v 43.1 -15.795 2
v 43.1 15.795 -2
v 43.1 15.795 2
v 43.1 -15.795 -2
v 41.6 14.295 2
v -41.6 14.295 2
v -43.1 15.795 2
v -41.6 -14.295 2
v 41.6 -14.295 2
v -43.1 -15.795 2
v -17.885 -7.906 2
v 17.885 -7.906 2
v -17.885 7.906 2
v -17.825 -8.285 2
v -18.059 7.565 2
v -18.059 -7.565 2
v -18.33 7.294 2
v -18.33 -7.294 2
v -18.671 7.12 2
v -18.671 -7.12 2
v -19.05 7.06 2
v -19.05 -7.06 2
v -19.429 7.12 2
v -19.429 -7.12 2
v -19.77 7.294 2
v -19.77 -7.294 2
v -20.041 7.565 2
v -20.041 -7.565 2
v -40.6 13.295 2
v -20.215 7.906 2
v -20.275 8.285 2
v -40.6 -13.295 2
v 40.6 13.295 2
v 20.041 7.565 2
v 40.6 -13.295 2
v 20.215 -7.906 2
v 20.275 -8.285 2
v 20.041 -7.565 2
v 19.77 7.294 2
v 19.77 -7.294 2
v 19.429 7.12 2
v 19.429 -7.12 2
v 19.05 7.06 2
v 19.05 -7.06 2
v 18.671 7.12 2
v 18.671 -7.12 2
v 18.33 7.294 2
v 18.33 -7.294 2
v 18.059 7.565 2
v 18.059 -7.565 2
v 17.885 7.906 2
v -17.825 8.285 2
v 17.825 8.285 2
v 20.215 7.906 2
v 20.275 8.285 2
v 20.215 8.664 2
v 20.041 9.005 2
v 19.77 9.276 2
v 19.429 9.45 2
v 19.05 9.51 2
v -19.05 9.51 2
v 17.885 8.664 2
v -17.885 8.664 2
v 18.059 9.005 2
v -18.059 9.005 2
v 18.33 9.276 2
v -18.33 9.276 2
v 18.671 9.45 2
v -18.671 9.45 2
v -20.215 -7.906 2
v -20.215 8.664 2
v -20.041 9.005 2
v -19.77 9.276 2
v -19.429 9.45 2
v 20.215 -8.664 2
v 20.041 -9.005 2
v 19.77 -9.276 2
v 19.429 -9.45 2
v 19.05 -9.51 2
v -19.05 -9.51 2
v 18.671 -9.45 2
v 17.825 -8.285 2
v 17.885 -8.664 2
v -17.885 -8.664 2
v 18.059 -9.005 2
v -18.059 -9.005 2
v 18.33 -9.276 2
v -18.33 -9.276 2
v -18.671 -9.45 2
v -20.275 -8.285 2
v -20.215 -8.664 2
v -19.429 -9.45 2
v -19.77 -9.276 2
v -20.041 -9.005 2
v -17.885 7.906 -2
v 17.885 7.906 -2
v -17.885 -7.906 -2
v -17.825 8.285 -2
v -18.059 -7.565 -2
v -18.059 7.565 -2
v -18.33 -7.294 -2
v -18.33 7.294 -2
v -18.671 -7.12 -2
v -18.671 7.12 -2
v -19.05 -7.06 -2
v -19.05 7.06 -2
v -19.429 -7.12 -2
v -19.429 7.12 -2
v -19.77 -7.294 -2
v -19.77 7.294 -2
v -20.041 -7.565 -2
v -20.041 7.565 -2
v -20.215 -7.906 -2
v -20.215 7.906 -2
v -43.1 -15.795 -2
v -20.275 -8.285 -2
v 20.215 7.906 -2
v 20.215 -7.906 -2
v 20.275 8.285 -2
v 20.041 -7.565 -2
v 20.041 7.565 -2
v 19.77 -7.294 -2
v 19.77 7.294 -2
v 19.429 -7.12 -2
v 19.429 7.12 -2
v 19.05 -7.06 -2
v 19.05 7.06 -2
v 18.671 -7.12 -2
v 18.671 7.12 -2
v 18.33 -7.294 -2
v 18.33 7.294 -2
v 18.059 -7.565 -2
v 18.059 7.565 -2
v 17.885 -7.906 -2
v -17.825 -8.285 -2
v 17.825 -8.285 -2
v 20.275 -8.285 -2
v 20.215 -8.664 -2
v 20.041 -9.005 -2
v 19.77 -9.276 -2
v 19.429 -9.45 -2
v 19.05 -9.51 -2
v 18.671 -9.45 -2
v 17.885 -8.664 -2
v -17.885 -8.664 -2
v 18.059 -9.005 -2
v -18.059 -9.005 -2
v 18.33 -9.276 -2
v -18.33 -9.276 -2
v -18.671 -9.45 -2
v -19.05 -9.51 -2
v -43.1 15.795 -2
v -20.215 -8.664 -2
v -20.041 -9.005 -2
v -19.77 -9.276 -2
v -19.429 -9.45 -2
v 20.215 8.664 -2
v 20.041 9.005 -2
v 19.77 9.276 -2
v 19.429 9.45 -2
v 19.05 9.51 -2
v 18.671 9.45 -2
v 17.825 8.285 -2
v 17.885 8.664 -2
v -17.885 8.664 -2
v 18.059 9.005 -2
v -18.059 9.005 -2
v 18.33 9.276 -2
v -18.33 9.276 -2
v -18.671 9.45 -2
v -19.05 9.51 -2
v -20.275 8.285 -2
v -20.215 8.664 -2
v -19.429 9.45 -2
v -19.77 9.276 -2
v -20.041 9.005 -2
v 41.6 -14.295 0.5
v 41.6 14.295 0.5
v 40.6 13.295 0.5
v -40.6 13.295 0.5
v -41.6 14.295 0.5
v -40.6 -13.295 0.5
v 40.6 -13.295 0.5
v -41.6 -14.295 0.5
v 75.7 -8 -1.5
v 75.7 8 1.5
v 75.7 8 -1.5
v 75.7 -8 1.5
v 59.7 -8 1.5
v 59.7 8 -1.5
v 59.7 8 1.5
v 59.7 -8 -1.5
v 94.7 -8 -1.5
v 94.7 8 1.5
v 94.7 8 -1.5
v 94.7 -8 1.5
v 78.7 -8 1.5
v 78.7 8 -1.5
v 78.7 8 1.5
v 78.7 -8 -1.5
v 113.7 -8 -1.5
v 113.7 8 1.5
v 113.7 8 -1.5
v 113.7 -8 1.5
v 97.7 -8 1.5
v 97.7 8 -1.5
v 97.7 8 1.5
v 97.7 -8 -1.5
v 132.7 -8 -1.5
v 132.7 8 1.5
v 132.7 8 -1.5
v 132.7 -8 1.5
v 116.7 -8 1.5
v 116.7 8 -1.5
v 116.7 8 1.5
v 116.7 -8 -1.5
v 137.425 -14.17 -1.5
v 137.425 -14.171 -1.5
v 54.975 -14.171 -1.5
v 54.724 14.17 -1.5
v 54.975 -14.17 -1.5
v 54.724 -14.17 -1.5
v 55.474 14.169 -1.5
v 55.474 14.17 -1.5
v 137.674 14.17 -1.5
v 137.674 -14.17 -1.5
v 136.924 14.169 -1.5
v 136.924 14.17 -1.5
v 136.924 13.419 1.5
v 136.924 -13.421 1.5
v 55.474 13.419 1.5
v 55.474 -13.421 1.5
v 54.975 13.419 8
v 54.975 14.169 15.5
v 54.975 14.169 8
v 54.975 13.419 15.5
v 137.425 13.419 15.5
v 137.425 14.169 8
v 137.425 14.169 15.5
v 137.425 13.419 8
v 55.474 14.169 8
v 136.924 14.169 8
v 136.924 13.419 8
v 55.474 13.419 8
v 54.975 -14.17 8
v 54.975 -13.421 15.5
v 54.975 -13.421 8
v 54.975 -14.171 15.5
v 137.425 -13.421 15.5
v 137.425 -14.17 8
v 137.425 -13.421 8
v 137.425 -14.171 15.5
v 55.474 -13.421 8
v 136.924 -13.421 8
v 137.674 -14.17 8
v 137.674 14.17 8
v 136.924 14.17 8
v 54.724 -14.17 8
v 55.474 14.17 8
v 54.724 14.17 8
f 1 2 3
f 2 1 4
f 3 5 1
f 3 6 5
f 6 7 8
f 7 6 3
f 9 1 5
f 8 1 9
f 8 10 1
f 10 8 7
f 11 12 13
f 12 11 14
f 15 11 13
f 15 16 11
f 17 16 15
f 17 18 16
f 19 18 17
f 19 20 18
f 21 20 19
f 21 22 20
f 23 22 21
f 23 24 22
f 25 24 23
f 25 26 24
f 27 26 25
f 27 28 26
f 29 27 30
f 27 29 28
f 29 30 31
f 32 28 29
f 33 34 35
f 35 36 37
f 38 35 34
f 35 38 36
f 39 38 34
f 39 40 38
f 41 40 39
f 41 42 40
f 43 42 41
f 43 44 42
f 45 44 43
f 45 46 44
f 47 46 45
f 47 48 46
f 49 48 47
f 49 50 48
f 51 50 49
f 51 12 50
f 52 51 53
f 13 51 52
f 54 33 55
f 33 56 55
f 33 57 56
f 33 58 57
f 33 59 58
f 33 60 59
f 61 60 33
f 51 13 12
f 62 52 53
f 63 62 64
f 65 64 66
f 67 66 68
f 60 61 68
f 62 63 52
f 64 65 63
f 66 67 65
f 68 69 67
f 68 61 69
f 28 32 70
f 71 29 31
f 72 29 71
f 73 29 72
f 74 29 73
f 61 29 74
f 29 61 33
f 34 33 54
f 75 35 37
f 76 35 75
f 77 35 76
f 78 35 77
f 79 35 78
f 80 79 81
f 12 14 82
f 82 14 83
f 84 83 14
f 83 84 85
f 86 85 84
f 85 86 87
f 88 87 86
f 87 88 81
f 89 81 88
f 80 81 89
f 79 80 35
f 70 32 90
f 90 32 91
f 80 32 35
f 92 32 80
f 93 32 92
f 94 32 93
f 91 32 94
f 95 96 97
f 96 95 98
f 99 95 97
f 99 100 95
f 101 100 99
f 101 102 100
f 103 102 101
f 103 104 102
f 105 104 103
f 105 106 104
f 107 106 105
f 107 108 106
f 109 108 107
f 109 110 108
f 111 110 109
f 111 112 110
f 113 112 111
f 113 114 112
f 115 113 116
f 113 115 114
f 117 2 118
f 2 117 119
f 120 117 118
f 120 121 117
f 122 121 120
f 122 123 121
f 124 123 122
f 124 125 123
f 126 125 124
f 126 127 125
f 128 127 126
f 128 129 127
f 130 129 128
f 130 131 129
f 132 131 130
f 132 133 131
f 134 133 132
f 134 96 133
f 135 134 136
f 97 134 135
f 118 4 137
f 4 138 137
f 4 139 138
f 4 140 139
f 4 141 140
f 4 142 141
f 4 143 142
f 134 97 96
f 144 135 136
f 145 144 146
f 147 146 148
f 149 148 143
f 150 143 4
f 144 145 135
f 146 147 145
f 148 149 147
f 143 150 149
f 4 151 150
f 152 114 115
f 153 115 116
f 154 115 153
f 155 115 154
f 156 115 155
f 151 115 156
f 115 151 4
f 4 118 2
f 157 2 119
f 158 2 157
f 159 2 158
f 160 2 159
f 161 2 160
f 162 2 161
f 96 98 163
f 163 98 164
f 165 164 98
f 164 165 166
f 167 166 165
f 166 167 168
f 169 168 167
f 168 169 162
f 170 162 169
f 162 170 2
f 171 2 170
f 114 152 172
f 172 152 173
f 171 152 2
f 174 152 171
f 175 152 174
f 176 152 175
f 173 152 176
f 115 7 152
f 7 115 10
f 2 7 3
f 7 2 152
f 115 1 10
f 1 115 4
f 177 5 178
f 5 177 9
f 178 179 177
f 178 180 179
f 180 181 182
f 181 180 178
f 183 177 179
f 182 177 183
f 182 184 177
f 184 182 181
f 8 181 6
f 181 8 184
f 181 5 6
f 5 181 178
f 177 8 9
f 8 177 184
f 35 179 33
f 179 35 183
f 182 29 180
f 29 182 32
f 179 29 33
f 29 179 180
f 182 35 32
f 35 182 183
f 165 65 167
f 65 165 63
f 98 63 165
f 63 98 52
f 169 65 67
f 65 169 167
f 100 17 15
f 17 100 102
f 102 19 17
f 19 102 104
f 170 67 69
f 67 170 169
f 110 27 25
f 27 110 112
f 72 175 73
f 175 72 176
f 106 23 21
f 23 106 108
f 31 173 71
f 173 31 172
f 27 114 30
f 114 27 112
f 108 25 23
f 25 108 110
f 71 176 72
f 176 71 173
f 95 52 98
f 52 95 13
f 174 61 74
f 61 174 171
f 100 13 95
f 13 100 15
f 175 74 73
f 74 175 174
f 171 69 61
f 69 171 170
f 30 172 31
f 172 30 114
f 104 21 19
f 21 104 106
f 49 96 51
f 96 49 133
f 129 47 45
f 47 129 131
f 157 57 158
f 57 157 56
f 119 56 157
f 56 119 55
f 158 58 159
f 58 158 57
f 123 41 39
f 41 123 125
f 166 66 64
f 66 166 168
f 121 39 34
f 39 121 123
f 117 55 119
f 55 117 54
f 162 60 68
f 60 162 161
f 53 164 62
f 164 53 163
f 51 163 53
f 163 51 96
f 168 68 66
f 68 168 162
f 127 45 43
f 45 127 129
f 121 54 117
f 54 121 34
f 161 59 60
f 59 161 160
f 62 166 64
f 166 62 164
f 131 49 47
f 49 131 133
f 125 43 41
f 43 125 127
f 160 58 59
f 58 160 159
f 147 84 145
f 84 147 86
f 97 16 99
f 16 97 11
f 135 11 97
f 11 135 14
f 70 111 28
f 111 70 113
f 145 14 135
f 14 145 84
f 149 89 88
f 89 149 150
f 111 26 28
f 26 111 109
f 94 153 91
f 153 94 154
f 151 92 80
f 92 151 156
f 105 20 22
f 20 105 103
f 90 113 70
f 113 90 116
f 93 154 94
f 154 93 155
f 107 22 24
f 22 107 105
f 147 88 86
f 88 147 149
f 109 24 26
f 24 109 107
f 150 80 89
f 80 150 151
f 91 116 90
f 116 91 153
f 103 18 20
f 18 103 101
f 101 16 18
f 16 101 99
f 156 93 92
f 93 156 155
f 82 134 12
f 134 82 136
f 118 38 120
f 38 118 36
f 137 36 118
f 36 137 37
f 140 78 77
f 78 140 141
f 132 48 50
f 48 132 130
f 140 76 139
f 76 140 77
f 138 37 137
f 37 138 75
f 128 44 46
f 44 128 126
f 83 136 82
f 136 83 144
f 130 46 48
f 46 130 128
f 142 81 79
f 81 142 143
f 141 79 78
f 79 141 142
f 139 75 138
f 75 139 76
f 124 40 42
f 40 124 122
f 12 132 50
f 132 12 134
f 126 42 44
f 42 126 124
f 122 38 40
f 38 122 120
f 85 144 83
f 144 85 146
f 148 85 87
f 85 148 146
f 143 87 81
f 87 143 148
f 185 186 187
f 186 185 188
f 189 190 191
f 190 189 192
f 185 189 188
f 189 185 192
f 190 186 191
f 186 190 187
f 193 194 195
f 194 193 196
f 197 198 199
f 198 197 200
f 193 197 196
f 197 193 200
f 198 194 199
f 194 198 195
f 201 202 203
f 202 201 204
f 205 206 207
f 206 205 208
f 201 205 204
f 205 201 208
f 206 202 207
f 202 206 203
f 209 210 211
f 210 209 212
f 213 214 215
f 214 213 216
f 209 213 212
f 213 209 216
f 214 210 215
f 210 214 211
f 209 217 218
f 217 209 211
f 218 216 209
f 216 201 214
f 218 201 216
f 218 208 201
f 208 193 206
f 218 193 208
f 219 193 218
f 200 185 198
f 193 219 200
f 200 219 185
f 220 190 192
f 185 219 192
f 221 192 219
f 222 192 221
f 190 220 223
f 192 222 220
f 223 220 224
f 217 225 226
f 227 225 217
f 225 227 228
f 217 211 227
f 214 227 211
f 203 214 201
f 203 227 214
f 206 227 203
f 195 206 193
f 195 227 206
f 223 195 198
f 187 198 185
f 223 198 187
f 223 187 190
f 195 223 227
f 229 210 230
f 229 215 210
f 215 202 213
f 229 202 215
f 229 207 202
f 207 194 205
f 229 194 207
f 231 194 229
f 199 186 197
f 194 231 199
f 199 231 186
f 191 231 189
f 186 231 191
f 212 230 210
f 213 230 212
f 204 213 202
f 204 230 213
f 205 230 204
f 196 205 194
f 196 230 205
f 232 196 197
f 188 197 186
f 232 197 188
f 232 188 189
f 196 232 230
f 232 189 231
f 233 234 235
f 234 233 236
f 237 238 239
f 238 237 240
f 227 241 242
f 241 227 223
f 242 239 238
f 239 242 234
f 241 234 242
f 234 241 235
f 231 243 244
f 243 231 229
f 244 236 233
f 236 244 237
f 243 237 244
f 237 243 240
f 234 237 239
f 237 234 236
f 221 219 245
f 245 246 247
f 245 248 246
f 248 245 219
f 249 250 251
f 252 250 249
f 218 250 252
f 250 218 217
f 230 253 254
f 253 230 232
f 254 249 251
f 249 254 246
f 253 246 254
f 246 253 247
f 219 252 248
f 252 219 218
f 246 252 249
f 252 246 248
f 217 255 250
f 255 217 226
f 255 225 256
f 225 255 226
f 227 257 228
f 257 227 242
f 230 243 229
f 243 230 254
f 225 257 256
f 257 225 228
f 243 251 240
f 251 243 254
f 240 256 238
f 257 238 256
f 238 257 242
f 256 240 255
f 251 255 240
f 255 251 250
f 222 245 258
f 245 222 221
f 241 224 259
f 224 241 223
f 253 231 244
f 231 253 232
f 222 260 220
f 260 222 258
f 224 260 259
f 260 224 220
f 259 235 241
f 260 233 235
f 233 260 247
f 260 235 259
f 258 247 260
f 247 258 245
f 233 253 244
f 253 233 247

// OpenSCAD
// SPDX-License-Identifier: MIT
$fa = 1;
$fs = 0.4;

// keyboard tray
kb_length = 76.2;
kb_width = 21.59;
kb_height = 4;

front_length = kb_length;
front_width = 17;
front_height = 0.75;

mounting_hole_diam = 2.45;
mounting_hole_height = 4;
mounting_hole_distance = 2.51;

// ### Begin Modules ###

module base_cube() {
    difference() {
        cube([kb_length + 10, kb_width + 10, kb_height], center=true);
        translate([0, 0, kb_height])
            cube([kb_length + 8, kb_width + 8, kb_height + 1]);
    }
}

// For fitting top and bottom together
module base_hollow_outline() {
    difference() {
        cube([kb_length + 7, kb_width + 7, kb_height], center=true);
        cube([kb_length + 5, kb_width + 5, kb_height + 1], center=true);
    }
}

module base_with_snapfit() {
    difference() {
        base_cube();
        translate([0, 0, kb_height - 1.5])
            base_hollow_outline();
    }
}

module complete_base() {
    difference() {
        base_with_snapfit();
        translate([-kb_length/2 + 19.05, kb_width/2 - mounting_hole_distance, 0])
            cylinder(d=mounting_hole_diam, h=mounting_hole_height, center=true);
        translate([kb_length/2 - 19.05, kb_width/2 - mounting_hole_distance, 0])
            cylinder(d=mounting_hole_diam, h=mounting_hole_height, center=true);
        translate([-kb_length/2 + 19.05, -kb_width/2 + mounting_hole_distance, 0])
            cylinder(d=mounting_hole_diam, h=mounting_hole_height, center=true);
        translate([kb_length/2 - 19.05, -kb_width/2 + mounting_hole_distance, 0])
            cylinder(d=mounting_hole_diam, h=mounting_hole_height, center=true);
    }
}

module keyboard_cover(num, space) {
  difference() {
    cube([kb_length + 6.25, kb_width + 6, kb_height - 1], center=true);
		for (i = [0 : num - 1])
            if (num == 4) {
                translate([-kb_length / 2 + 9.6 + space*i, 0, 0])
                    children(0);
            }
            else {
                translate([-kb_length / 2 + 29 + space*i, 0, 0])
                    children(0);
            }
	}
    // front
    rotate([90,0,0])
    translate([0, -front_width / 2 + 1.5, kb_width / 2 + 3 - 0.001])
        cube([front_length + 6.25, front_width, front_height], center = true);
    // back
    rotate([90,0,0])
    translate([0, -front_width / 2 + 1.5, -kb_width / 2 - 3 - 0.001])
        cube([front_length + 6.25, front_width, front_height], center = true);
    // left side
    rotate([90, 0, 90])
    if (num == 4) {
        translate([0, -front_width / 2 + 5.25, kb_length / 2 + 3 - 0.001])
        cube([kb_width + 6.75, front_width - 7.5, front_height], center = true);
    }
    else {
        translate([0, -front_width / 2 + 1.5, kb_length / 2 + 3 - 0.001])
        cube([kb_width + 6.75, front_width, front_height], center = true);
    }
    // right side
   rotate([90, 0, 90])
   translate([0, -front_width / 2 + 5.25, -kb_length / 2 - 3 - 0.001])
        cube([kb_width + 6.75, front_width - 7.5, front_height], center = true);
}


module key_holes(){
  cube([16, 16, kb_height], center=true);
}

// ### End Modules ###

// Construction of the parts

show_base = 0;
show_top = 0;
show_all = 1;
do_rotate = 0;
keys = 4;


if (show_base == 1) {
    if (do_rotate == 1) {
        rotate([180, 0, 0])
            complete_base();
    }
    else {
        complete_base();
    }
}

if (show_top == 1) {
    if (do_rotate == 1) {
        rotate([180, 0, 0])
            keyboard_cover(keys, 19) key_holes();
    }
    else {
        keyboard_cover(keys, 19) key_holes();
    }
}

if (show_all == 1) {
    complete_base();
    rotate([180, 0, 0])
    translate([kb_length + 20, 0, 0])
        keyboard_cover(4, 19) key_holes();
}
